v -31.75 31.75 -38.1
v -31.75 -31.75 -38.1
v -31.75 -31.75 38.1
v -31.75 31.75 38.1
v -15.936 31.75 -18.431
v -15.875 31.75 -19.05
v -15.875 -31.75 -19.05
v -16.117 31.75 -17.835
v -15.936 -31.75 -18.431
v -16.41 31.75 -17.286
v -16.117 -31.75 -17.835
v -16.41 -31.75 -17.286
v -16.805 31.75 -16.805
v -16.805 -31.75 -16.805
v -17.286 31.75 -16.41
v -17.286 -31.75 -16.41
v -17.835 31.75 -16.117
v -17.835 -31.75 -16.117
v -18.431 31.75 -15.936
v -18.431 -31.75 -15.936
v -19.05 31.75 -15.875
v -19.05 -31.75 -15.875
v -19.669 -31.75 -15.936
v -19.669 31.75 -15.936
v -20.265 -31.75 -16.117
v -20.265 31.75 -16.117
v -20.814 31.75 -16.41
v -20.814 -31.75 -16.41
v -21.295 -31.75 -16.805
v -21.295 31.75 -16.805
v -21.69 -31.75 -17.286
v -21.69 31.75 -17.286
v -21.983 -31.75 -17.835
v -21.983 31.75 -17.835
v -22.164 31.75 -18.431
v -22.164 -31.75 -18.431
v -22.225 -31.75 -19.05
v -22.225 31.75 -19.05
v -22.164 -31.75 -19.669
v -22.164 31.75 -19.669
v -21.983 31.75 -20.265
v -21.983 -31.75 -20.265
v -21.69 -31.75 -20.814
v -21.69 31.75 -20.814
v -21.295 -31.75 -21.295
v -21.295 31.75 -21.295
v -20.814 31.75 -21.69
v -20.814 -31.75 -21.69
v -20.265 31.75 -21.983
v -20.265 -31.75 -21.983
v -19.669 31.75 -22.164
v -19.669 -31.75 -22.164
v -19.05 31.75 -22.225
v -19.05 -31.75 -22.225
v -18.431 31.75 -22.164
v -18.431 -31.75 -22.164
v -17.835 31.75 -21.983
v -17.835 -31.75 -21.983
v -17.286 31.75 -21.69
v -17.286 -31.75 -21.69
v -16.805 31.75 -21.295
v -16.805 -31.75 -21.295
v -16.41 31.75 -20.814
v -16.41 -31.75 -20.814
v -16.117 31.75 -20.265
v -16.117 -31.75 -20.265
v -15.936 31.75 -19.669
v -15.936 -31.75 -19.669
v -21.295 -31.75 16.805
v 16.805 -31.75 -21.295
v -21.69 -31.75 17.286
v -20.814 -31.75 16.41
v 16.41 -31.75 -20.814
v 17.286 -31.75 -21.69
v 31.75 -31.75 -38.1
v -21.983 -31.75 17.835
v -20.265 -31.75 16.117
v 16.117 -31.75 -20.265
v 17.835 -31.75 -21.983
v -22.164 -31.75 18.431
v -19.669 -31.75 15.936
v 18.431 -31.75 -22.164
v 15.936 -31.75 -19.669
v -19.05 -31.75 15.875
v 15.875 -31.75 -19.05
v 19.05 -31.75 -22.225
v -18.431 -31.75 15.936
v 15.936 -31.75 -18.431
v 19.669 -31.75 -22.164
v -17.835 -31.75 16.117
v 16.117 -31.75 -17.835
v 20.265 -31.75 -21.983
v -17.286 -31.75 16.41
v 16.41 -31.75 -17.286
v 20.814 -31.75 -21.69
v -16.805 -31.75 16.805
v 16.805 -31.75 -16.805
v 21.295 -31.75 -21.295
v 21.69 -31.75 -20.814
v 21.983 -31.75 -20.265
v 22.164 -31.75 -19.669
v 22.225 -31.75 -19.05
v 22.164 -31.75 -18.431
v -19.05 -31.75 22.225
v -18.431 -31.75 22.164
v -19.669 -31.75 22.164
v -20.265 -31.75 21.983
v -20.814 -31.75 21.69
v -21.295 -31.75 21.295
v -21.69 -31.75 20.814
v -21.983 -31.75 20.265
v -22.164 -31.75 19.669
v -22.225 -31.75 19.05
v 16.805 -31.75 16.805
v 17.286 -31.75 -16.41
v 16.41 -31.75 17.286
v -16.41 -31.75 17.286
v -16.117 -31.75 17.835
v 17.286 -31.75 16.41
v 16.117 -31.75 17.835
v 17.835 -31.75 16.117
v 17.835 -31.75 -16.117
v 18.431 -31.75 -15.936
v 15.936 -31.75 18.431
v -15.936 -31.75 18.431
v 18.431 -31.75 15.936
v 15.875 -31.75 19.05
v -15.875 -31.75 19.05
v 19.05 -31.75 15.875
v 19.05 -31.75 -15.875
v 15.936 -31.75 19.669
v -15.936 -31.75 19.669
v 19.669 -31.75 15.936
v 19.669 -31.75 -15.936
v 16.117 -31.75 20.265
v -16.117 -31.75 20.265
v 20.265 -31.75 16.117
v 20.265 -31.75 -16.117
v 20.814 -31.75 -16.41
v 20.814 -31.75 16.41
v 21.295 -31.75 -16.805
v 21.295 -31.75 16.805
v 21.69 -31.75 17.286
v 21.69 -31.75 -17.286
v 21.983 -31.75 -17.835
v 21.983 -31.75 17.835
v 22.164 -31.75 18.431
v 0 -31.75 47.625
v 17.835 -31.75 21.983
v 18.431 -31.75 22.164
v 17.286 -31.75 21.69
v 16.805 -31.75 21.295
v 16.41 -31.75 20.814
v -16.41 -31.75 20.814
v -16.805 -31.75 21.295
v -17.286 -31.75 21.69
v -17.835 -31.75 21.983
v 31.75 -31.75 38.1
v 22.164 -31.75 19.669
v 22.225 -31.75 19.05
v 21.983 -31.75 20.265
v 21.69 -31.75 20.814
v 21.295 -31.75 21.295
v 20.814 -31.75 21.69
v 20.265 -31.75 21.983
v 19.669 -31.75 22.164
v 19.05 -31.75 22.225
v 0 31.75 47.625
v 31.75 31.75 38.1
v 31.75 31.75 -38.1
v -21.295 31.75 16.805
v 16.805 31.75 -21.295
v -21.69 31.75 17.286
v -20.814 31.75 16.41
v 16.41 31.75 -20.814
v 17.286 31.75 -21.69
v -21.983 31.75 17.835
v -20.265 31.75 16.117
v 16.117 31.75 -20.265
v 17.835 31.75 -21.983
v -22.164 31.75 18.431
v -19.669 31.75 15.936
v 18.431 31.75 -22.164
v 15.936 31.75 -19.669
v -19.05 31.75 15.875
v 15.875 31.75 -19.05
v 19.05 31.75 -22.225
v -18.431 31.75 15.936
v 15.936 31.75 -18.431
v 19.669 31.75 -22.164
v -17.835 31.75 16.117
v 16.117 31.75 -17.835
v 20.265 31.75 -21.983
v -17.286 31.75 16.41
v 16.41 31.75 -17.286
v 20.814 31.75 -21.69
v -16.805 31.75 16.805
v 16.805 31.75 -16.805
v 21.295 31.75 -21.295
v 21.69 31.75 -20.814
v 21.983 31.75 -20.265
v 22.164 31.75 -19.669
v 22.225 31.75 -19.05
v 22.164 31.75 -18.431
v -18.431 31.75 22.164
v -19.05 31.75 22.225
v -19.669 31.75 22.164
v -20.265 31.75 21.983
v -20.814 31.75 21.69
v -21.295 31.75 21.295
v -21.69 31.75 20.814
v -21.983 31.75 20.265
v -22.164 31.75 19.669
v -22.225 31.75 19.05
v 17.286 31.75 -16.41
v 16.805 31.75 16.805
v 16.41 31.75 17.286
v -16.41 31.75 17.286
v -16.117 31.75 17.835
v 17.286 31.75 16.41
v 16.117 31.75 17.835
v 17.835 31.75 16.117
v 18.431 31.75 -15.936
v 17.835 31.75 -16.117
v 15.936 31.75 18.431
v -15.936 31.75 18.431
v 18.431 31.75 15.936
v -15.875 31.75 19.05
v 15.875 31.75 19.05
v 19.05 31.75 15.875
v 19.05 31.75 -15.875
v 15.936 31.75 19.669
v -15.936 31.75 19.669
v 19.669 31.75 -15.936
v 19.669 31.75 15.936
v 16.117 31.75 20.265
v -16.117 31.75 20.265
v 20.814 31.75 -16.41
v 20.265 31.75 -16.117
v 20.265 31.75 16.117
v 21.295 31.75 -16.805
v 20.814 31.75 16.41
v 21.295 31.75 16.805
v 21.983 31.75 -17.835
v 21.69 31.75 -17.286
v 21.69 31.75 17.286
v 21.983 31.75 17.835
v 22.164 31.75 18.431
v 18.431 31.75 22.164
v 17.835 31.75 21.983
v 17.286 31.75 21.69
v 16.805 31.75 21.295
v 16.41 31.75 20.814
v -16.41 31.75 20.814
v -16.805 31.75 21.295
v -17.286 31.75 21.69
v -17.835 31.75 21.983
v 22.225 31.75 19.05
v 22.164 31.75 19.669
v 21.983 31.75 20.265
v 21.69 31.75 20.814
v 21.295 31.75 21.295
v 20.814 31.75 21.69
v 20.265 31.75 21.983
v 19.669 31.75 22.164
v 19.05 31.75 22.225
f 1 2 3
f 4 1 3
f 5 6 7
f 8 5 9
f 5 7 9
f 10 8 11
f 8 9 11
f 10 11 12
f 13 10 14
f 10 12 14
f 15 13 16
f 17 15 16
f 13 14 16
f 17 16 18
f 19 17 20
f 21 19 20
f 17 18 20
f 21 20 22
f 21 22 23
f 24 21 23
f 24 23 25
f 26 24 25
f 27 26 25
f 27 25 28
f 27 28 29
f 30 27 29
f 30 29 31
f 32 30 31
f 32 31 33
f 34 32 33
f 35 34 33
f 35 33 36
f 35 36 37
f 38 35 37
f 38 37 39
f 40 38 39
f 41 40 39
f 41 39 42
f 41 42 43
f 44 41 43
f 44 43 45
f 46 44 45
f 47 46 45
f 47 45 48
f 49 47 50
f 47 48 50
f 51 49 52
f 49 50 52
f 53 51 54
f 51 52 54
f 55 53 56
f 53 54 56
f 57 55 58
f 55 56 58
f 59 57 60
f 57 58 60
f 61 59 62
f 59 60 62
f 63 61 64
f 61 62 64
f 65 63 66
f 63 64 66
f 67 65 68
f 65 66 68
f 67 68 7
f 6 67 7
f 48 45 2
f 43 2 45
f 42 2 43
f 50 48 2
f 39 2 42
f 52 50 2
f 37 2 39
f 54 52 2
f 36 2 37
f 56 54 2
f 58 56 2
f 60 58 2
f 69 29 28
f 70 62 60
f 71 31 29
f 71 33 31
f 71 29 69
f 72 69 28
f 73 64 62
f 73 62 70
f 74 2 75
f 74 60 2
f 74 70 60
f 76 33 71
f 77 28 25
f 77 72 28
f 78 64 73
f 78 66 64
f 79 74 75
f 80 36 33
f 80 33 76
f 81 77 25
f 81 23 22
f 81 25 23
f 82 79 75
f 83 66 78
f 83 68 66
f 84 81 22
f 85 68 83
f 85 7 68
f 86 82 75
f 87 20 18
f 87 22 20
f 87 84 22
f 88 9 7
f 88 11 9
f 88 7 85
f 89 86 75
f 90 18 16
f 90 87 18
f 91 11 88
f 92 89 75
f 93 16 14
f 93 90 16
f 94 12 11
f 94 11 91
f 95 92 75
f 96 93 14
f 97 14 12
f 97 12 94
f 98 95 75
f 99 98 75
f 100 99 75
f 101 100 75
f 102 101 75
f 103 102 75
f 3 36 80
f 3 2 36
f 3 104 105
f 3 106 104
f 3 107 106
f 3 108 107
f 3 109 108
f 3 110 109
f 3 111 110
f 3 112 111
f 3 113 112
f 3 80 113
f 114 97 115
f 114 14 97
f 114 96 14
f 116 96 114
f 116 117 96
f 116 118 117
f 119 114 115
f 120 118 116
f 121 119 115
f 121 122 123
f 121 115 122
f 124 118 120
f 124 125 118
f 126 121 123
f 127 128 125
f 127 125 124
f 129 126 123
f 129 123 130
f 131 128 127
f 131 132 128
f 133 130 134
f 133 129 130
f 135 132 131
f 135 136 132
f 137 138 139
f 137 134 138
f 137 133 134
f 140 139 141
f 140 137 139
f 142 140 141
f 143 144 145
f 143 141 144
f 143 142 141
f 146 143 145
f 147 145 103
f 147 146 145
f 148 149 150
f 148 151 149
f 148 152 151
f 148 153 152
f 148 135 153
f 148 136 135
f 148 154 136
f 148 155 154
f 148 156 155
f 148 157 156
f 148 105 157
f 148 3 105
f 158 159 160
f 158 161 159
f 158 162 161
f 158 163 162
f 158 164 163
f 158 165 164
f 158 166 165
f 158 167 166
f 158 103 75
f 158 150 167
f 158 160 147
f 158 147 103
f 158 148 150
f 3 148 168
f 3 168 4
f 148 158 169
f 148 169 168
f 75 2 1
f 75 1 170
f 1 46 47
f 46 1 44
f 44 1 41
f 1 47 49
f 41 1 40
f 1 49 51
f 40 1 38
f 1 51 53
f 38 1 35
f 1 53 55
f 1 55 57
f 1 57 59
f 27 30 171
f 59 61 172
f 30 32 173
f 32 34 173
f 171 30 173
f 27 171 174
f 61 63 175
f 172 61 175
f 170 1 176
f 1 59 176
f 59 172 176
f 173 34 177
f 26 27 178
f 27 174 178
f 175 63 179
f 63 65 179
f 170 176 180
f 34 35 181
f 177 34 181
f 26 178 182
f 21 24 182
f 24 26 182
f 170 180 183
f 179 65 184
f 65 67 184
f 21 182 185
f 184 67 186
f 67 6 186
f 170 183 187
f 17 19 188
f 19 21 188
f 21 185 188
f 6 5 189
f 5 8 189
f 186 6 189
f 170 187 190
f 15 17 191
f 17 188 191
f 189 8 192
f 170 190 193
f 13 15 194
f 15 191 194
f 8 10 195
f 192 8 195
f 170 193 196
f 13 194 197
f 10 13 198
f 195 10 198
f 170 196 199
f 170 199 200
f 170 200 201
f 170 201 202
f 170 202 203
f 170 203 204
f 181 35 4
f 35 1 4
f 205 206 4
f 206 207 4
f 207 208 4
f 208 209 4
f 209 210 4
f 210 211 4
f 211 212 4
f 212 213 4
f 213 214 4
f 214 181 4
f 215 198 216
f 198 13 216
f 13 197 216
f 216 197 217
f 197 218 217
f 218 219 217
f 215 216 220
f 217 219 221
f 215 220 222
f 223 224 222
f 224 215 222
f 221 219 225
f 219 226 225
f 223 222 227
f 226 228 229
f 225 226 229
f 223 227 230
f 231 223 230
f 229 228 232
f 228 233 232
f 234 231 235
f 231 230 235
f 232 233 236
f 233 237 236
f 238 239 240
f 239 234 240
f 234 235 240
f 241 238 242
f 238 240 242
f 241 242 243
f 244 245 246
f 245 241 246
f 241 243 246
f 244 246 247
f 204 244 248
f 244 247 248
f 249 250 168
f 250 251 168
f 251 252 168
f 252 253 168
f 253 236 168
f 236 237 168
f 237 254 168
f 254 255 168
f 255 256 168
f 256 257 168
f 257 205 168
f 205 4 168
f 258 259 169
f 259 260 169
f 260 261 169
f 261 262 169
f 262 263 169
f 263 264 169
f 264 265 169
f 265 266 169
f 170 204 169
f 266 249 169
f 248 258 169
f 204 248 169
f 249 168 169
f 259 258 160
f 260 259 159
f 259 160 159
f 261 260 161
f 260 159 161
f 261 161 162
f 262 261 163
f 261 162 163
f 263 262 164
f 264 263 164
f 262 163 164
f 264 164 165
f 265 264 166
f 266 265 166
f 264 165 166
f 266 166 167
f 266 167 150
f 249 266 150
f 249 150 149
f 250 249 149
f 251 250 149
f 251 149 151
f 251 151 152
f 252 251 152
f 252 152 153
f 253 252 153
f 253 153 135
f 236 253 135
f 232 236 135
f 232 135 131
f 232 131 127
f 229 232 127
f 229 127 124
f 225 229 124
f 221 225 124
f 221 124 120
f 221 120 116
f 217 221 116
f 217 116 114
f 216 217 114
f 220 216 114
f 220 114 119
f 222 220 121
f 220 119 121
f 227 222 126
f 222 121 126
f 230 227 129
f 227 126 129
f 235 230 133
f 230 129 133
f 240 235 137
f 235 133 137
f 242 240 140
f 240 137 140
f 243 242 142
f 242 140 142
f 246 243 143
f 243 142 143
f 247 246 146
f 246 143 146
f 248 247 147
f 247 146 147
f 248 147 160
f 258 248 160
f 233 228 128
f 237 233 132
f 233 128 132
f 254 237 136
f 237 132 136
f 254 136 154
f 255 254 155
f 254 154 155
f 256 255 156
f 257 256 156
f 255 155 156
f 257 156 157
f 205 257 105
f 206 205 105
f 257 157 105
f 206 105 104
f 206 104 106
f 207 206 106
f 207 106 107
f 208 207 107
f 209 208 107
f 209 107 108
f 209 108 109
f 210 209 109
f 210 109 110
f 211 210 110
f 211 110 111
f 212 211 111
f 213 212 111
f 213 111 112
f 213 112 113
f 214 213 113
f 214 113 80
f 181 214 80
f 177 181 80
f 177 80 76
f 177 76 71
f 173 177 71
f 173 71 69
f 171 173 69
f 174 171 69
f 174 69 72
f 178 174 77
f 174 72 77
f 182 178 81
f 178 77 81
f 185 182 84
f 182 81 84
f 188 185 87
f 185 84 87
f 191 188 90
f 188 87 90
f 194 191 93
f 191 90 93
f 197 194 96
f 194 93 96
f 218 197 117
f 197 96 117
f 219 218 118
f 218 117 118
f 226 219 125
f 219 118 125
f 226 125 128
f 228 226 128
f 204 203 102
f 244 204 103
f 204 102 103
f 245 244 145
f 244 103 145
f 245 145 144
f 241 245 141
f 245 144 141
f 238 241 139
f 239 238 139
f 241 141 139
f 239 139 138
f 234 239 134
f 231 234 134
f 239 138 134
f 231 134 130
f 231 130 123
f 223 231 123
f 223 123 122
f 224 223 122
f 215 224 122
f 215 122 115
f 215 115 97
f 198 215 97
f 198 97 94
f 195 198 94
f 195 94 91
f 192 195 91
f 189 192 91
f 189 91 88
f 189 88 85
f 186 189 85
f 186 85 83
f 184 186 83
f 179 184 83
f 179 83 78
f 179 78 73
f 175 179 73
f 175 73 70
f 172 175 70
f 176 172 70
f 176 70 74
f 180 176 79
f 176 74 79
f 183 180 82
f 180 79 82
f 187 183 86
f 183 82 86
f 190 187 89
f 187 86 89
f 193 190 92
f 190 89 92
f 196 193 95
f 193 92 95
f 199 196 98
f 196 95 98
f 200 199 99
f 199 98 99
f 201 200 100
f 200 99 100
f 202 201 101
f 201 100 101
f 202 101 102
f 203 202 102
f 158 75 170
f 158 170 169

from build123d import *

# Parameters (mm, degrees)
F0_W     = 63.5
F0_H     = 76.2
F1_DEPTH = 31.75
F3_DEPTH = 63.5
F5_D     = 6.35


with BuildPart() as f1:
    # F0 (on Front) → F1 (new body, symmetric)
    with BuildSketch(Plane.XZ):
        Rectangle(F0_W, F0_H)
    extrude(amount=F1_DEPTH, both=True)

    # F2 (on face) → F3 (join, through all)
    with BuildSketch(Plane.XZ.offset(31.75)):
        Polygon((0, 47.625), (-31.75, 38.1), (31.75, 38.1), align=None)
    extrude(amount=-F3_DEPTH)

    # F5 (through all)
    with Locations(Plane(origin=(0, 31.75, 0), x_dir=(-1, 0, 0), z_dir=(0, 1, 0))):
        with Locations((-19.05, 19.05), (19.05, 19.05), (-19.05, -19.05), (19.05, -19.05)):
            Hole(F5_D / 2)


solid = f1.part
